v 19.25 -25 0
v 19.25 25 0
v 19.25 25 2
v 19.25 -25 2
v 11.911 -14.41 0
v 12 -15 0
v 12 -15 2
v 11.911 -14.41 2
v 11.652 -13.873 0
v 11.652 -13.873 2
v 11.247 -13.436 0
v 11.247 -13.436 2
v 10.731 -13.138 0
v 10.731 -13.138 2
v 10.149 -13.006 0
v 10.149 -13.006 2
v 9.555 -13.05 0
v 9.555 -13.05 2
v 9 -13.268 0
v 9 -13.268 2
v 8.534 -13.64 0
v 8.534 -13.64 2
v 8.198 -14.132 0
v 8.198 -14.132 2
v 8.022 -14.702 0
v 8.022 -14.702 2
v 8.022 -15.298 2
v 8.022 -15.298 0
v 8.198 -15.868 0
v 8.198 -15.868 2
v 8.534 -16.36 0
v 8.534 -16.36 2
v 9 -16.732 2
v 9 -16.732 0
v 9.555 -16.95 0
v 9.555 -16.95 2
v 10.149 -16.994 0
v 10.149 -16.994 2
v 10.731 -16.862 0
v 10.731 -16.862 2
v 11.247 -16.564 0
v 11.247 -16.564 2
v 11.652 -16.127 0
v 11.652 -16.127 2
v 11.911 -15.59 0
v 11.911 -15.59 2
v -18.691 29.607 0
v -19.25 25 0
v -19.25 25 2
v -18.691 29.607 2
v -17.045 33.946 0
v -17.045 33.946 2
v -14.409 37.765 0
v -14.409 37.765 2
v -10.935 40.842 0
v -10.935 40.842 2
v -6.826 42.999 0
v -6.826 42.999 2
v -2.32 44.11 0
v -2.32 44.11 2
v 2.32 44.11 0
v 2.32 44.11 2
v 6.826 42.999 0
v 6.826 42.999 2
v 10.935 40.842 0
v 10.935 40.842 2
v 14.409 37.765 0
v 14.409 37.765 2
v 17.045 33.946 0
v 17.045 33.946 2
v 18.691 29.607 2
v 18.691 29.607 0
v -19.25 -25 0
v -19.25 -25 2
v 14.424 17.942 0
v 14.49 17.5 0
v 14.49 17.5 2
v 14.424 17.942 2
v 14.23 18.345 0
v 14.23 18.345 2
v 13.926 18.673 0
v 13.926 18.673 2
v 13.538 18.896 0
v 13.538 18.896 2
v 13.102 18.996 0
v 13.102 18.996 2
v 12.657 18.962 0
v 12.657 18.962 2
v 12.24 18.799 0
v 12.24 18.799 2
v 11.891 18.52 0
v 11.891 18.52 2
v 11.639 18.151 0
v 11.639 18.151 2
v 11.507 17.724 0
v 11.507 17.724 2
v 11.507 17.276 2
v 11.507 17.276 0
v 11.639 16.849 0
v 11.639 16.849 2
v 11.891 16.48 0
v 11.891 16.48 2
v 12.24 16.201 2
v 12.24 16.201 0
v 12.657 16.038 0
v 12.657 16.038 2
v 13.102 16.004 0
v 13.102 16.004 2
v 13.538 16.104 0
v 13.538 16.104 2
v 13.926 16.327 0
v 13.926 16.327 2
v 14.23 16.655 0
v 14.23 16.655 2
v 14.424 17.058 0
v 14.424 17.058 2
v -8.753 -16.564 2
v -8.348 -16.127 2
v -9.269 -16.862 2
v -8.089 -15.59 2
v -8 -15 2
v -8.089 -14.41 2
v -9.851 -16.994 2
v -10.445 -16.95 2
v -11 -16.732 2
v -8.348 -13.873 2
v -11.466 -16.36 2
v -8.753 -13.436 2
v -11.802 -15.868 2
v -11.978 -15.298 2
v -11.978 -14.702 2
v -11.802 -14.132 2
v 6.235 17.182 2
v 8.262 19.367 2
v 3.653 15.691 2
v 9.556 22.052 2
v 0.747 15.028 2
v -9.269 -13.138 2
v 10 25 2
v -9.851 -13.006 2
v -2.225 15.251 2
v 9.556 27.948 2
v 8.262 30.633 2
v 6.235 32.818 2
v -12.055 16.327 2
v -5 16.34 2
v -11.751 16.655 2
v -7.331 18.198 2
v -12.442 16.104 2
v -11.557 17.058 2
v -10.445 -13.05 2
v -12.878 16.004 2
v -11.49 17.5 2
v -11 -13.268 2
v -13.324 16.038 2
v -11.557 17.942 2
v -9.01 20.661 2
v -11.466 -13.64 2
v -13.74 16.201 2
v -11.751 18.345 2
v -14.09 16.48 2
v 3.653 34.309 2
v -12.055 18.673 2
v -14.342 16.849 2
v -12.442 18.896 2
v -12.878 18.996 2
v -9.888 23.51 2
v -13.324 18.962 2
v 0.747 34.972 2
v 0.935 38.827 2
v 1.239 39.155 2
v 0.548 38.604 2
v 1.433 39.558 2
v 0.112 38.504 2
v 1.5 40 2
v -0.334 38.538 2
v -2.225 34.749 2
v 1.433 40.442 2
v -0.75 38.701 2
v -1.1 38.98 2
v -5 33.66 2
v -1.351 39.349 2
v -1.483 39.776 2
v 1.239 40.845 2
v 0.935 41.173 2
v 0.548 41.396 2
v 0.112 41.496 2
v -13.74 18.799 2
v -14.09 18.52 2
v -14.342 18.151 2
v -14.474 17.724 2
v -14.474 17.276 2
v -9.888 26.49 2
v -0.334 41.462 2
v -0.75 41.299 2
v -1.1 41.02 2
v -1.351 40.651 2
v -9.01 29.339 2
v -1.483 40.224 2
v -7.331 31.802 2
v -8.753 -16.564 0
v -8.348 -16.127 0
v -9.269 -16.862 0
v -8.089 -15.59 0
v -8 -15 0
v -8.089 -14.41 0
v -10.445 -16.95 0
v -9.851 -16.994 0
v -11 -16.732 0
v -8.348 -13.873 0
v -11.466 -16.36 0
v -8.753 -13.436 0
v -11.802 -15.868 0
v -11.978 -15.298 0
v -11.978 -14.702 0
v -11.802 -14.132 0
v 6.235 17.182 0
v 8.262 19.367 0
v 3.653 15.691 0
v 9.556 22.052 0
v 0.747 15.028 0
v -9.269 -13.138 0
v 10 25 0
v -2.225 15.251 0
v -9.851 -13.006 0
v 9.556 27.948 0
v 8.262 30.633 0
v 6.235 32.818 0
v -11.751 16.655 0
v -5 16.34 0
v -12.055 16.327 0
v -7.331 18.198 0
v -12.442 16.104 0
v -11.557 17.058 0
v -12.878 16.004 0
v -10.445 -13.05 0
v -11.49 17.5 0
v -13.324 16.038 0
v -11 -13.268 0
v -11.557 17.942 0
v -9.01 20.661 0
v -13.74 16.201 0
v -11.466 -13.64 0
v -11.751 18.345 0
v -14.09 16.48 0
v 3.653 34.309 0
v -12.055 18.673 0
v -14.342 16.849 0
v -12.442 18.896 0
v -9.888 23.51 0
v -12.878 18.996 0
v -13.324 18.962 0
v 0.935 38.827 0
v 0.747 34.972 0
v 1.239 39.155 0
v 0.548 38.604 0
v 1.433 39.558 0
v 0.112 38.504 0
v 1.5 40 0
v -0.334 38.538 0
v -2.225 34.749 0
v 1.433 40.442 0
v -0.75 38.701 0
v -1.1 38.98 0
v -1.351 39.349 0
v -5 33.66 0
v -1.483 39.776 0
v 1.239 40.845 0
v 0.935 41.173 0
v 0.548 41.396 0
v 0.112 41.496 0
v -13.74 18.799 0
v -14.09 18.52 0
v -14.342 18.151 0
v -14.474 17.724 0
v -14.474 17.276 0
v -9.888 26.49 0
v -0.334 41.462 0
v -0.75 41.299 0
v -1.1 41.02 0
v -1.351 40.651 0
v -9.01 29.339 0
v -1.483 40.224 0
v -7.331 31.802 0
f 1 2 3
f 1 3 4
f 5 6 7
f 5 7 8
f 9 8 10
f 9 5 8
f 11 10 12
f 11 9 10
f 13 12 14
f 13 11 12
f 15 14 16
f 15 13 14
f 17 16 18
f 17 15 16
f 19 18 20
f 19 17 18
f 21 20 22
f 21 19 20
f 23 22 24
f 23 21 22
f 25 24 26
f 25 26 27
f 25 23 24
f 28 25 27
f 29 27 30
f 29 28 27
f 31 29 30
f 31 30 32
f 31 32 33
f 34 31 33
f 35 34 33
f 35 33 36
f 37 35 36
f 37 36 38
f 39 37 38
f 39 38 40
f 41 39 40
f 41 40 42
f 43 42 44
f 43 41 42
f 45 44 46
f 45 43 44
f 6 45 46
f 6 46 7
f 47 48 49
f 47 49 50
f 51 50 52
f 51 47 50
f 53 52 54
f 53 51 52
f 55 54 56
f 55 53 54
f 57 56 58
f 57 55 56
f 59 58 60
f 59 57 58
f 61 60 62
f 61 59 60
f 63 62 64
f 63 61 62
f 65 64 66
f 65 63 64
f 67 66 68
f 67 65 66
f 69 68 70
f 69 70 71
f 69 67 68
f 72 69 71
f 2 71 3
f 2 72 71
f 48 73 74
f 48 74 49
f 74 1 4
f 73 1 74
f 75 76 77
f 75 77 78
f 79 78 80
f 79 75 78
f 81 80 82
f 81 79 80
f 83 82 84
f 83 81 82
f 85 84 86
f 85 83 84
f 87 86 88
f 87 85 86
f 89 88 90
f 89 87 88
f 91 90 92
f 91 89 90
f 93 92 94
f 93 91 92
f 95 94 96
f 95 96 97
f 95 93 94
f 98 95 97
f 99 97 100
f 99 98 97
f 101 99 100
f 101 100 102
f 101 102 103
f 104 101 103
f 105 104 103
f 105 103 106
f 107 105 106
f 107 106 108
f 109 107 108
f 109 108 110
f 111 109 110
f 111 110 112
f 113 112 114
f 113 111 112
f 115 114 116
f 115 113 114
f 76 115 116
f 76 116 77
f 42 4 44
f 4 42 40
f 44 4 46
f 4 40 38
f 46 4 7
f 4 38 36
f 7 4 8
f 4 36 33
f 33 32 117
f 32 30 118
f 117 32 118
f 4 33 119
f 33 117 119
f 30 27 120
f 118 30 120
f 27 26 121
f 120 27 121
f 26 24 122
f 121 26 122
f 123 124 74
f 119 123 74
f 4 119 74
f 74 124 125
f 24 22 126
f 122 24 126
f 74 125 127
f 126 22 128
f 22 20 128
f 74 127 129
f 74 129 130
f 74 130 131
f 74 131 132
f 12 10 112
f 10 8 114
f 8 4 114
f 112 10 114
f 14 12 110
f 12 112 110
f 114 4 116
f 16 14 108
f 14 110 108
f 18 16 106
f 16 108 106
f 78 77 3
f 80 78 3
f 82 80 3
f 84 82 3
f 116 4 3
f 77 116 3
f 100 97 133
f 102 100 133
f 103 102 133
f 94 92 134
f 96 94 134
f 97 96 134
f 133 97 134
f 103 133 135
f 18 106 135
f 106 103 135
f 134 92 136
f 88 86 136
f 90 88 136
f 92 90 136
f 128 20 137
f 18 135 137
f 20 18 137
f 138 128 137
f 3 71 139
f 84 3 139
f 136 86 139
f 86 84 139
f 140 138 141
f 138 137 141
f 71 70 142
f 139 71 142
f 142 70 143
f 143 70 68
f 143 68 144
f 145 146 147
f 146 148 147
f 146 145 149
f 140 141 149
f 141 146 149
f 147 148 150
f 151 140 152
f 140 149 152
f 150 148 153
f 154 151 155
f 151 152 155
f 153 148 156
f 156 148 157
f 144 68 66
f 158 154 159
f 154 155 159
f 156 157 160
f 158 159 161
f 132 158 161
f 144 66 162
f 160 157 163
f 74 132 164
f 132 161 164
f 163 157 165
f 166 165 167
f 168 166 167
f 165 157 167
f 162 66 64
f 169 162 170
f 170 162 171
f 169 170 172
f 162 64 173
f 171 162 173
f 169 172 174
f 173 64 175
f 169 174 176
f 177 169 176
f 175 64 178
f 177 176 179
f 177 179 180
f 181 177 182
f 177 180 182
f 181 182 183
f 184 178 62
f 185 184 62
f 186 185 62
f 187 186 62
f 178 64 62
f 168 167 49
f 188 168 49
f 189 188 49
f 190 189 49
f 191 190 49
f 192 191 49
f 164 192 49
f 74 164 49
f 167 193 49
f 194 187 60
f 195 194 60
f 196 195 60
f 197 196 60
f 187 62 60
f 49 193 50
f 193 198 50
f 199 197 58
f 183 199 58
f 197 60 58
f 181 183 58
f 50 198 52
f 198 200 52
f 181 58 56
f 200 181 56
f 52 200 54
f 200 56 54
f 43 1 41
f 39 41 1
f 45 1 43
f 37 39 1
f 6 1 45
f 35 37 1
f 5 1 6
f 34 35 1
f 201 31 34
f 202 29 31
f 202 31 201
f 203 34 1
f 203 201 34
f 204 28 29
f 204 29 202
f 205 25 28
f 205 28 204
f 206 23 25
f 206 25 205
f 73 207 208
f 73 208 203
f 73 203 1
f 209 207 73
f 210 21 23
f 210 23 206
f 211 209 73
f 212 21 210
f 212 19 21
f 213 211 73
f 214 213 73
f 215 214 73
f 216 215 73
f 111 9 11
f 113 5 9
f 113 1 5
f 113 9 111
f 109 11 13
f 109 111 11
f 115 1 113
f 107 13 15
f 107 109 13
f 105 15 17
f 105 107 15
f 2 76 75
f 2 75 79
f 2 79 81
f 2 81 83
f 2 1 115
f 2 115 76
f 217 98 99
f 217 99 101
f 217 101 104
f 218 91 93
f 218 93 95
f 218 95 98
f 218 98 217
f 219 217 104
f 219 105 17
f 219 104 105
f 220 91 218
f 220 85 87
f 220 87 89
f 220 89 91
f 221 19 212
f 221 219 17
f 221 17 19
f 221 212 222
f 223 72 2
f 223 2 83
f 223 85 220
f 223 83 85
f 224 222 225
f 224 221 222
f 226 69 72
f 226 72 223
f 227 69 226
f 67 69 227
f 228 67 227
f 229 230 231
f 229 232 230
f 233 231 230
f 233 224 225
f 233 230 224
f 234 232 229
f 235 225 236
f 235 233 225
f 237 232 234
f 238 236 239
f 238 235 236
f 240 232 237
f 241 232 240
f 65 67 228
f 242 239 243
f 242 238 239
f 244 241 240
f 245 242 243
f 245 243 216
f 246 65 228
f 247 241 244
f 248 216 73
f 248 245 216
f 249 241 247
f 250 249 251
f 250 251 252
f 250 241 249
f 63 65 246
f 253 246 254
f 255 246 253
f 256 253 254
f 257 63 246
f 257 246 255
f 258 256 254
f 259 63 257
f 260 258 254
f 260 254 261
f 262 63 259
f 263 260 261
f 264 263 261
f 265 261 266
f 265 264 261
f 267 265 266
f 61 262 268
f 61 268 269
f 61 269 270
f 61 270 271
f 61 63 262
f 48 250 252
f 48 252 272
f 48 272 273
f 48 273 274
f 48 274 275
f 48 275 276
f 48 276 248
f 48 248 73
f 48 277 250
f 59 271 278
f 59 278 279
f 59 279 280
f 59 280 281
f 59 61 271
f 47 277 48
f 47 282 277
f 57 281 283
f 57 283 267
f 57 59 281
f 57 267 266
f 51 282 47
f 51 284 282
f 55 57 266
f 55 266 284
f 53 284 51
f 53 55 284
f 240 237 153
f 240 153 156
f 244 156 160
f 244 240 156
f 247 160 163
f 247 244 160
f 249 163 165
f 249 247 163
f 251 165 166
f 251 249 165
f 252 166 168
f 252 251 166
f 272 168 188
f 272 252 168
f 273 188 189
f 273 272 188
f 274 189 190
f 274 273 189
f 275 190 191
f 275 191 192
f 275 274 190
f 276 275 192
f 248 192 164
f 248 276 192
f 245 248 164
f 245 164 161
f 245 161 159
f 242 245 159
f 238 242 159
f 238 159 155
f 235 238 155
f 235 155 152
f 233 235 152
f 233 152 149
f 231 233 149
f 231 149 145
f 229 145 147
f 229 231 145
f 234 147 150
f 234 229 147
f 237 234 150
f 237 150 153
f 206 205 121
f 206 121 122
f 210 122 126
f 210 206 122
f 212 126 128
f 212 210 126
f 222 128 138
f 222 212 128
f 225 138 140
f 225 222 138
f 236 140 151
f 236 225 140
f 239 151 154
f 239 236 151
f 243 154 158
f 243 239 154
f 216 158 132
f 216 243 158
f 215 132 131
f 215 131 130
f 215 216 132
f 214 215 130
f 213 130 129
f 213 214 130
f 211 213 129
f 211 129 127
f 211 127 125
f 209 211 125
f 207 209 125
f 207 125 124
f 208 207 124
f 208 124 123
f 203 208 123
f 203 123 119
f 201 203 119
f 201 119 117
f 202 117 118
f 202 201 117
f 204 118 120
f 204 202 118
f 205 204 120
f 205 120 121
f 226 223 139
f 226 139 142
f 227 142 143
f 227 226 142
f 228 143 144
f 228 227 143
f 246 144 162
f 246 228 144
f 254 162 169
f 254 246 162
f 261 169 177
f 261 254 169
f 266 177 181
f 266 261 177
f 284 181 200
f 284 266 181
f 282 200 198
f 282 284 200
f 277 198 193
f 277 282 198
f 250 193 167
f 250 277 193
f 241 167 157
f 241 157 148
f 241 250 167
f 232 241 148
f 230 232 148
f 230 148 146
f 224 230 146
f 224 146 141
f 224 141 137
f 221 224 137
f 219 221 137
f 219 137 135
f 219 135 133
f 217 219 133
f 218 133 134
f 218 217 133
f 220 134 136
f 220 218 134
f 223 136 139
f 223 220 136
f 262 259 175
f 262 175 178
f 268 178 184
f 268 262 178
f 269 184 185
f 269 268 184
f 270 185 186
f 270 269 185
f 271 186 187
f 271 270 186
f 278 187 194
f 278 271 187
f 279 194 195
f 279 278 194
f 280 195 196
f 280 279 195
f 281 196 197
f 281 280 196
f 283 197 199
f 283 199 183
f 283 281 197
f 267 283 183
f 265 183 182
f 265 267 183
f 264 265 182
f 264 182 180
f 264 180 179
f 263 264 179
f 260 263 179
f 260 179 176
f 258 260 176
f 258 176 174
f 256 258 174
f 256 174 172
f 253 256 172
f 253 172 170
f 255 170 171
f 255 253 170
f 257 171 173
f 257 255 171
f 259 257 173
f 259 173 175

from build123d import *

# Parameters (mm, degrees)
SKETCH1_R           = 1.5
SKETCH1_R_2         = 2
SKETCH1_R_3         = 10
BOSS_EXTRUDE1_DEPTH = 2


with BuildPart() as part:
    # Sketch1 → Boss-Extrude1 (new body)
    with BuildSketch(Plane.XY):
        with BuildLine():
            ThreePointArc((-19.25, 25), (0, 44.25), (19.25, 25))
            Line((19.25, 25), (19.25, -25))
            Line((19.25, -25), (-19.25, -25))
            Line((-19.25, -25), (-19.25, 25))
        make_face()
        with Locations((-12.990381057, 17.5)):
            Circle(SKETCH1_R, mode=Mode.SUBTRACT)
        with Locations((12.990381057, 17.5)):
            Circle(SKETCH1_R, mode=Mode.SUBTRACT)
        with Locations((10, -15)):
            Circle(SKETCH1_R_2, mode=Mode.SUBTRACT)
        with Locations((-10, -15)):
            Circle(SKETCH1_R_2, mode=Mode.SUBTRACT)
        with Locations((0, 40)):
            Circle(SKETCH1_R, mode=Mode.SUBTRACT)
        with Locations((0, 25)):
            Circle(SKETCH1_R_3, mode=Mode.SUBTRACT)
    extrude(amount=BOSS_EXTRUDE1_DEPTH)


solid = part.part
